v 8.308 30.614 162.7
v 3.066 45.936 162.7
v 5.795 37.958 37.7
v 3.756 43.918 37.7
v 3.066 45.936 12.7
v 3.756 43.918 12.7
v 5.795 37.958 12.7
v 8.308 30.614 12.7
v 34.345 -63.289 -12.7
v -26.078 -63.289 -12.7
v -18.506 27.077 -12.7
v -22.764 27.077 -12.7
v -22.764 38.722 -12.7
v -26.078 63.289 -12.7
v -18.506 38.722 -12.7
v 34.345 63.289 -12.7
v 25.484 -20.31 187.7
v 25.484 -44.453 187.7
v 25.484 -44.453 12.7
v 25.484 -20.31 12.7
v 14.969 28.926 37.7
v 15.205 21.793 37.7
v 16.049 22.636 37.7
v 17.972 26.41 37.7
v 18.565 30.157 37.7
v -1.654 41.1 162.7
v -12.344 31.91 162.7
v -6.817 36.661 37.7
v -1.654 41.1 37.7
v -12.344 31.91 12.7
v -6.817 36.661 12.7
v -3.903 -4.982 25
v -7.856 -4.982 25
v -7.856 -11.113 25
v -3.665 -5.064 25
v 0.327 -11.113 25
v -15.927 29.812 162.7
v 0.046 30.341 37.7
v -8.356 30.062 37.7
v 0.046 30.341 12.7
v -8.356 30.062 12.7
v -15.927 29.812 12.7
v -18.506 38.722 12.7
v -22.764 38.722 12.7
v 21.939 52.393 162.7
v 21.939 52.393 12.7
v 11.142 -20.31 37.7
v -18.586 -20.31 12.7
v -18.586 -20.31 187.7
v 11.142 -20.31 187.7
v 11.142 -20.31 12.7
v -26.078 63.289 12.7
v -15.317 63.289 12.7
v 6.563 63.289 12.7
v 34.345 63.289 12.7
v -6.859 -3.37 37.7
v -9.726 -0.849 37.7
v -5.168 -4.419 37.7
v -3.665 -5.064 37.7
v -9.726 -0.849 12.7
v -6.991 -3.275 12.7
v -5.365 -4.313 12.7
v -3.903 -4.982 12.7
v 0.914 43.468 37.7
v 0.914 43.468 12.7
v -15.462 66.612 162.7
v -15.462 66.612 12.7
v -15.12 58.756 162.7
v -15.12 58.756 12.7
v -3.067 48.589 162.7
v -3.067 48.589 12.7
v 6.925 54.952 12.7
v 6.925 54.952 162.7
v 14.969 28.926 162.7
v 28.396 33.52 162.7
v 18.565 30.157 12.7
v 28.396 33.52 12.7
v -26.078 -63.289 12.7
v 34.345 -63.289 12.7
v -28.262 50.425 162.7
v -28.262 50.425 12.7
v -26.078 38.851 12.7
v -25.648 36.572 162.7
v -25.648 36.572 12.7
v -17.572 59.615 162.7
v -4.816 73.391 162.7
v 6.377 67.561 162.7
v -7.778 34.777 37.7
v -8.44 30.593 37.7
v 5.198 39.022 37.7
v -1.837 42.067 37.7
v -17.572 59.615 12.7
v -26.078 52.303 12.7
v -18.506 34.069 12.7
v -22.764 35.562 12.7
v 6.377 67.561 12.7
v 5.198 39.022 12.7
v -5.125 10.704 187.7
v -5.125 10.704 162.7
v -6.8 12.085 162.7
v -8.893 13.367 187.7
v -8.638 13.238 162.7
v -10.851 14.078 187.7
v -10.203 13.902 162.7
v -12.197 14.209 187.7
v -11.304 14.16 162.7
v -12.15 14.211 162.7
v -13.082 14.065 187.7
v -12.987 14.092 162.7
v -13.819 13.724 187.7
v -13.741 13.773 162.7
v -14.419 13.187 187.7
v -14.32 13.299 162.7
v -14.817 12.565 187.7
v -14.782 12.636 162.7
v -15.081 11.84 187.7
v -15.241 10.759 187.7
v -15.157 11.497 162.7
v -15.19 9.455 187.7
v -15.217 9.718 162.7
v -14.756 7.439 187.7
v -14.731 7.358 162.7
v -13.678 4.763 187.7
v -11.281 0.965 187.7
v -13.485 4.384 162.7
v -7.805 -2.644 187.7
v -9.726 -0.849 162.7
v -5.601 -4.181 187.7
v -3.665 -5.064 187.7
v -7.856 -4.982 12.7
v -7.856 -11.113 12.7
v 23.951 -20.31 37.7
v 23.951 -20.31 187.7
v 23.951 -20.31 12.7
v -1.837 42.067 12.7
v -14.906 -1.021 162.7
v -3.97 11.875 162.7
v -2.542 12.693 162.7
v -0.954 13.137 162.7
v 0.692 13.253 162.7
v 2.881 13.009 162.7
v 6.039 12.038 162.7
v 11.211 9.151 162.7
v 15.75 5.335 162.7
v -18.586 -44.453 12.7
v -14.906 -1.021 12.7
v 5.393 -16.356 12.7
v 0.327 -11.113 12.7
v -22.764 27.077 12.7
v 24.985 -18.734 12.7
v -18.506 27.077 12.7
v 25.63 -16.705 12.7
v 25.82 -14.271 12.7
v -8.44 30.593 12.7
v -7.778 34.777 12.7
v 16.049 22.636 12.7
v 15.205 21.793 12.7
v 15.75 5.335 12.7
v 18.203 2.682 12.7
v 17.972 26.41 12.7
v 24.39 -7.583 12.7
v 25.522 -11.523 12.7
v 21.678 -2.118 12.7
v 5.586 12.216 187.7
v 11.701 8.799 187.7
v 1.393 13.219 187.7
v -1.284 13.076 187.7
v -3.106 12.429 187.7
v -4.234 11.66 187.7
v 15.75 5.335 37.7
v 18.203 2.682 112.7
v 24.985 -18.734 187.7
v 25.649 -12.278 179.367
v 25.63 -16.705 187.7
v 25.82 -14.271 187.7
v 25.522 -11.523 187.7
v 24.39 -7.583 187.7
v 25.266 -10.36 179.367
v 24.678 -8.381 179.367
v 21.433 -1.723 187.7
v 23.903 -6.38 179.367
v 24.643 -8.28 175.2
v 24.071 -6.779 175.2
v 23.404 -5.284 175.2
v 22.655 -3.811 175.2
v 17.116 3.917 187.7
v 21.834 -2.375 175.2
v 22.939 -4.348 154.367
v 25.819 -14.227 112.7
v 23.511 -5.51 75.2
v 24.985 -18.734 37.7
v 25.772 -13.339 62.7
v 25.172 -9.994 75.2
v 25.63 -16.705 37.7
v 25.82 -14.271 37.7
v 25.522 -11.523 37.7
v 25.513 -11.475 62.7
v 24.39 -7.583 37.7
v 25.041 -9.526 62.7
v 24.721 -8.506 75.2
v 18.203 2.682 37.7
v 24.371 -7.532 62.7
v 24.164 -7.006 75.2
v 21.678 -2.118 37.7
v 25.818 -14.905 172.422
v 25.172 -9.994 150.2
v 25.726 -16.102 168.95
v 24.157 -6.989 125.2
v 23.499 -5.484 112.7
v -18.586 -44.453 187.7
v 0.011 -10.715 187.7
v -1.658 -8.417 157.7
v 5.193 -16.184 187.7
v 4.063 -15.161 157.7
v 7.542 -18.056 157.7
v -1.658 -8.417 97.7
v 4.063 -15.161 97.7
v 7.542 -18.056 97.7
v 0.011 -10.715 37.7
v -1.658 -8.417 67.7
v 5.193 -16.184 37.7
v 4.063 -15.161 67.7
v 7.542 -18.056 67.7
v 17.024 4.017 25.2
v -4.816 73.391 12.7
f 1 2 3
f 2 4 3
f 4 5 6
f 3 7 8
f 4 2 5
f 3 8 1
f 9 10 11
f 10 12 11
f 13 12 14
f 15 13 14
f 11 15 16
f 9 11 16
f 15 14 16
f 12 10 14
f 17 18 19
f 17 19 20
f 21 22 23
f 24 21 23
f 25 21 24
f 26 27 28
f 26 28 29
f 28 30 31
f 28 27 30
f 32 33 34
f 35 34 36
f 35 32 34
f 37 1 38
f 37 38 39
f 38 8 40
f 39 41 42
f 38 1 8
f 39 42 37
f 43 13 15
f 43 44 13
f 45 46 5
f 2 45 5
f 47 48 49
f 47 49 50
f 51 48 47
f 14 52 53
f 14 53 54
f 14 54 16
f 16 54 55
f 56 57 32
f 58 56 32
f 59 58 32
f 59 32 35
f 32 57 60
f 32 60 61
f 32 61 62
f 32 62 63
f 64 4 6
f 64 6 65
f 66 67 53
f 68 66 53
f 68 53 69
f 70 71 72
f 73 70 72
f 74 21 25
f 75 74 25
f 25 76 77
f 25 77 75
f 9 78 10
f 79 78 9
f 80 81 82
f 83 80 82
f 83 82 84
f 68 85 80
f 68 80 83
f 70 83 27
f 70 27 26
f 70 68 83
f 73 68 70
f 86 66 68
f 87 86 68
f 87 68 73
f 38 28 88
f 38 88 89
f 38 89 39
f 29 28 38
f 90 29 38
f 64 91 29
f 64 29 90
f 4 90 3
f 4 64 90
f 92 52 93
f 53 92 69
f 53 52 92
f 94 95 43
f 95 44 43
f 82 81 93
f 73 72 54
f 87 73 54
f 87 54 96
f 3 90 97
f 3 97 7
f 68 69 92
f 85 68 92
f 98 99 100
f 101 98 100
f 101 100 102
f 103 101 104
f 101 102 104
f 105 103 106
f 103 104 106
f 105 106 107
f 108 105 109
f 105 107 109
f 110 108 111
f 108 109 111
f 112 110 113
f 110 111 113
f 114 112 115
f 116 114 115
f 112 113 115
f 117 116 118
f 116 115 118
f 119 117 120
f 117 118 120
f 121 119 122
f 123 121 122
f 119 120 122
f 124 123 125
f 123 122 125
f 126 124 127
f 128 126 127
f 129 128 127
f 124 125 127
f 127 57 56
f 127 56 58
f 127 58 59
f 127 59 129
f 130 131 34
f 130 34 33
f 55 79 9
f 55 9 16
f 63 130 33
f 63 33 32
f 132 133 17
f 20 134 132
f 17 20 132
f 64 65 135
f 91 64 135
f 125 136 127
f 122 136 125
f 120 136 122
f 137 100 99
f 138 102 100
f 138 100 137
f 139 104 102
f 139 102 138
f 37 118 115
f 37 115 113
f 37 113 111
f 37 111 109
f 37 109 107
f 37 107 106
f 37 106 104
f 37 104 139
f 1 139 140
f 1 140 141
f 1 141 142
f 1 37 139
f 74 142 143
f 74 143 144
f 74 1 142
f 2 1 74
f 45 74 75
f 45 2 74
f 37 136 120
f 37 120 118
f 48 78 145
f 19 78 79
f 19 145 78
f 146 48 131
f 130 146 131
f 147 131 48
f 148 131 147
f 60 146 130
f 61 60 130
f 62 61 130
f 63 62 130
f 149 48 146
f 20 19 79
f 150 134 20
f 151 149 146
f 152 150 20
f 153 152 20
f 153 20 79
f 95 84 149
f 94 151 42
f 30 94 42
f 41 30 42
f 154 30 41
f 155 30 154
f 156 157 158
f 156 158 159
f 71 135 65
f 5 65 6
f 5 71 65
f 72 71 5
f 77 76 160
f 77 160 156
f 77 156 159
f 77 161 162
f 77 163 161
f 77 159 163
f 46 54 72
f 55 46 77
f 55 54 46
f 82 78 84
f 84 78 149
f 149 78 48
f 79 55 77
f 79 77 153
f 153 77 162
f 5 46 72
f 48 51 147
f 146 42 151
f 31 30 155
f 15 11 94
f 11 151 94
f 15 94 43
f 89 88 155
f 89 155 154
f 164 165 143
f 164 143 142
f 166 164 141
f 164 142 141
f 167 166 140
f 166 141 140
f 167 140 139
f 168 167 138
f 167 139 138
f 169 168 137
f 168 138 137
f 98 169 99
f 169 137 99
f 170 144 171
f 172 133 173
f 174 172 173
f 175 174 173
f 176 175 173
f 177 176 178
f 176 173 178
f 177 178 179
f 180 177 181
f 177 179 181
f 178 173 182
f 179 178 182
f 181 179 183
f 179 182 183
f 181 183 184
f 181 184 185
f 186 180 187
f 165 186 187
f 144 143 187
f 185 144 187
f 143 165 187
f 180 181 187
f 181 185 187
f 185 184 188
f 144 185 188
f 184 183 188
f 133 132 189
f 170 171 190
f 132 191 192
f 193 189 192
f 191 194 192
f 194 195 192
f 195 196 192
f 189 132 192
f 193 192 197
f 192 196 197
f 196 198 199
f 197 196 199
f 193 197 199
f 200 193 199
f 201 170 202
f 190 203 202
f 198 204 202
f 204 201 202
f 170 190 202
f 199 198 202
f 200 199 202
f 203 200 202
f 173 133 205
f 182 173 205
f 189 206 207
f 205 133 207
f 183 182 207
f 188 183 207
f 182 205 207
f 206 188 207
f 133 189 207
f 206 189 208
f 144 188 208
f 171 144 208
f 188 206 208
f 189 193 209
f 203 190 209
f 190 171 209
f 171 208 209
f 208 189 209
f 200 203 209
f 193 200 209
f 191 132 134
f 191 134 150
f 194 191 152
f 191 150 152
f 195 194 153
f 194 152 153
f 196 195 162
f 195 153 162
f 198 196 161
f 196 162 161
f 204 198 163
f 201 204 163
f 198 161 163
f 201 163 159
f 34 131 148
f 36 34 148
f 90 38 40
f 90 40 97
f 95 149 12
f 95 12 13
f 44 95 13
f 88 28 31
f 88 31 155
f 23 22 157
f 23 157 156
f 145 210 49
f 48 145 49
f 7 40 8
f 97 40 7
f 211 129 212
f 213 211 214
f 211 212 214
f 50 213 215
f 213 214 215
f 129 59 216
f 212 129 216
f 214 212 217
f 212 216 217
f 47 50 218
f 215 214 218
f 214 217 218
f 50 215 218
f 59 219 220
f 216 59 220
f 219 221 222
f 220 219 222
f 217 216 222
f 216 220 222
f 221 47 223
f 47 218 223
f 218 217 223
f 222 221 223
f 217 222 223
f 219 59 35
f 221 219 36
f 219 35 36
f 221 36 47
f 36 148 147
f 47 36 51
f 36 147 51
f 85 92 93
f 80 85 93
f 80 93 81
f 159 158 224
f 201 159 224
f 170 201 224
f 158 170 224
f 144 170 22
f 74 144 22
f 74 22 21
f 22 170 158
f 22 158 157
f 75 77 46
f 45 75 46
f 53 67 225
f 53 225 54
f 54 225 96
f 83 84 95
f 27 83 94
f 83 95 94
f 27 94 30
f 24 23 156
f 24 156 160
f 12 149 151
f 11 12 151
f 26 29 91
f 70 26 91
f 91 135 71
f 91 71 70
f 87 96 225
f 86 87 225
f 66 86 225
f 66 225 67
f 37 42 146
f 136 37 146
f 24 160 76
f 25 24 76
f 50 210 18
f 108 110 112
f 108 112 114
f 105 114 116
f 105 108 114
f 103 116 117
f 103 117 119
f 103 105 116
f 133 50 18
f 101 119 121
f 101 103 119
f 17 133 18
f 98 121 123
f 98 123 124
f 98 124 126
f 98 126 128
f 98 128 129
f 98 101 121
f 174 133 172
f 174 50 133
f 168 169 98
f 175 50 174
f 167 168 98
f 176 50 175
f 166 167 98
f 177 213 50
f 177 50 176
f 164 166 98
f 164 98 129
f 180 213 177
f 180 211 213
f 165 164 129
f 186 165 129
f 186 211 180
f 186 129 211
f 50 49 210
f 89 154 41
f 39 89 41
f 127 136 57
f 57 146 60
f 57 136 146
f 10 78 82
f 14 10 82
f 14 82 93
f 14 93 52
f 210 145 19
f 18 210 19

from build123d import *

# Parameters (mm, degrees)
F0_W      = 60.4223795235
F0_H      = 126.5786588192
F0_W_2    = 4.2580850422
F0_H_2    = 11.6458535194
F1_DEPTH  = 12.7
F4_DEPTH  = 25
F5_W      = 44.0693465061
F5_H      = 24.1423398256
F6_DEPTH  = 25
F7_W      = 27.9744537547
F7_H      = 6.1313877814
F8_DEPTH  = 25
F10_DEPTH = 25
F13_DEPTH = 150


with BuildPart() as f1:
    # F0 (on Top) → F1 (new body, symmetric)
    with BuildSketch(Plane.XY):
        with Locations((4.1334796697, 0)):
            Rectangle(F0_W, F0_H)
        with Locations((-20.6351820379, 32.8994877636)):
            Rectangle(F0_W_2, F0_H_2, mode=Mode.SUBTRACT)
    extrude(amount=F1_DEPTH, both=True)

    # F3 (on face) → F4 (join)
    with BuildSketch(Plane.XY.offset(12.7)):
        Polygon((9.2804457981, 43.4682284111), (5.0971903838, 44.1307909787), (0.9139349695, 43.4682284111), (-2.8598342584, 41.545396949), (-5.8547144745, 38.5505167329), (-7.7775459366, 34.776747505), (-8.4401085041, 30.5934920907), (-7.7775459366, 26.4102366764), (-5.8547144745, 22.6364674485), (-2.8598342584, 19.6415872324), (0.9139349695, 17.7187557703), (5.0971903838, 17.0561932027), (9.2804457981, 17.7187557703), (13.054215026, 19.6415872324), (16.0490952421, 22.6364674485), (17.9719267043, 26.4102366764), (18.6344892718, 30.5934920907), (17.9719267043, 34.776747505), (16.0490952421, 38.5505167329), (13.054215026, 41.545396949), align=None)
        Polygon((-2.2527005044, 26.4659842643), (5.197609196, 39.0224382281), (12.3466624599, 26.2920537797), align=None, mode=Mode.SUBTRACT)
    extrude(amount=F4_DEPTH)

    # F5 (on face) → F6 (join)
    with BuildSketch(Plane.XY.offset(12.7)):
        with Locations((3.4489056561, -32.3813892901)):
            Rectangle(F5_W, F5_H)
    extrude(amount=F6_DEPTH)

    # F7 (on Top) → F8 (join)
    with BuildSketch(Plane.XY):
        with Locations((6.1313877814, -8.0474459101)):
            Rectangle(F7_W, F7_H)
    extrude(amount=F8_DEPTH)

    # F9 (on face) → F10 (join)
    with BuildSketch(Plane.XY.offset(12.7)):
        with BuildLine():
            add(Edge.make_bspline(
                [(-3.6654782741, -5.0642236167), (-1.2137473257, -5.8734401187), (0.1916065812, -4.7901463695)],
                knots=[5.6666909862, 5.6666909862, 5.6666909862, 6.2831853072, 6.2831853072, 6.2831853072], degree=2, weights=[1, 0.9528668255, 1]))
            add(Edge.make_bspline(
                [(0.1916065812, -4.7901463695), (6.4545371904, 0.0375298105), (-5.1250907994, 10.7039809585)],
                knots=[0, 0, 0, 1.9137670292, 1.9137670292, 1.9137670292], degree=2, weights=[1, 0.5760701954, 1]))
            add(Edge.make_bspline(
                [(-5.1250907994, 10.7039809585), (-9.1468374458, 5.3420650054), (-3.6654782741, -5.0642236167)],
                knots=[0.1210246027, 0.1210246027, 0.1210246027, 1.1768049687, 1.1768049687, 1.1768049687], degree=2, weights=[1, 0.8638717322, 1]))
        make_face()
        with BuildLine():
            add(Edge.make_bspline(
                [(0.1916065812, -4.7901463695), (6.4545371904, 0.0375298105), (-5.1250907994, 10.7039809585)],
                knots=[0, 0, 0, 1.9137670292, 1.9137670292, 1.9137670292], degree=2, weights=[1, 0.5760701954, 1]))
            add(Edge.make_bspline(
                [(-3.6654782741, -5.0642236167), (-1.2137473257, -5.8734401187), (0.1916065812, -4.7901463695)],
                knots=[5.6666909862, 5.6666909862, 5.6666909862, 6.2831853072, 6.2831853072, 6.2831853072], degree=2, weights=[1, 0.9528668255, 1]))
            add(Edge.make_bspline(
                [(-3.6654782741, -5.0642236167), (7.7967294339, -26.8250748804), (21.3915865986, -22.0091251639), (34.9864437633, -17.1931754474), (18.2025562972, 2.6824818924)],
                knots=[1.1768049687, 1.1768049687, 1.1768049687, 2.9445969746, 2.9445969746, 4.7123889804, 4.7123889804, 4.7123889804], degree=2, weights=[1, 0.6341435153, 1, 0.6341435153, 1]))
            add(Edge.make_bspline(
                [(18.2025562972, 2.6824818924), (2.66192218, 21.0858654459), (-5.1250907994, 10.7039809585)],
                knots=[4.7123889804, 4.7123889804, 4.7123889804, 6.4042099098, 6.4042099098, 6.4042099098], degree=2, weights=[1, 0.6630500062, 1]))
        make_face()
        with BuildLine():
            add(Edge.make_bspline(
                [(-5.1250907994, 10.7039809585), (-9.1468374458, 5.3420650054), (-3.6654782741, -5.0642236167)],
                knots=[0.1210246027, 0.1210246027, 0.1210246027, 1.1768049687, 1.1768049687, 1.1768049687], degree=2, weights=[1, 0.8638717322, 1]))
            add(Edge.make_bspline(
                [(-5.1250907994, 10.7039809585), (-16.2578023137, 20.958759749), (-15.2138378826, 9.6808045144), (-14.1698734514, -1.5971507202), (-3.6654782741, -5.0642236167)],
                knots=[1.9137670292, 1.9137670292, 1.9137670292, 3.7902290077, 3.7902290077, 5.6666909862, 5.6666909862, 5.6666909862], degree=2, weights=[1, 0.5912156804, 1, 0.5912156804, 1]))
        make_face()
    extrude(amount=F10_DEPTH)

    # F12 (on face) + F10_face (on face) → F13 (join)
    with BuildSketch(Plane.XY.offset(12.7)):
        Polygon((-15.1200483821, 58.7558450371), (-4.268118646, 54.9524389207), (-3.0674270983, 48.5890431418), (6.9253058173, 54.9524389207), (6.3772096892, 67.5610487277), (-4.8162147741, 73.3906884605), (-15.4615431093, 66.6117183864), align=None)
        Polygon((-3.0674270983, 48.5890431418), (-4.268118646, 54.9524389207), (-15.1200483821, 58.7558450371), (-14.9134469812, 54.0031085795), (-3.7200225179, 48.1734688466), align=None)
        Polygon((-1.6542957296, 41.0997639807), (-3.0674270983, 48.5890431418), (-3.7200225179, 48.1734688466), (-14.9134469812, 54.0031085795), (-15.1200483821, 58.7558450371), (-17.5717985126, 59.6151393441), (-28.2616554628, 50.4251648275), (-25.6478325464, 36.5724898875), (-12.3441526798, 31.9097894641), align=None)
        Polygon((28.3961594105, 33.5202328861), (21.9387635589, 52.3932985961), (3.0656978488, 45.9359027445), (8.3079936012, 30.6142166531), (14.9058774114, 30.8326855302), (14.9690065658, 28.9261493169), align=None)
        Polygon((15.9268081188, 0), (14.9690065658, 28.9261493169), (9.5230937004, 27.0628370345), (8.3079936012, 30.6142166531), (-15.9268081188, 29.8117548227), (-14.9058774114, -1.0209307075), align=None)
        Polygon((9.5230937004, 27.0628370345), (14.9690065658, 28.9261493169), (14.9058774114, 30.8326855302), (8.3079936012, 30.6142166531), align=None)
    with BuildSketch(Plane(origin=(4.9113998877, -19.1714286629, 37.7), x_dir=(1, 0, 0), z_dir=(0, 0, 1))):
        with BuildLine():
            Line((20.5721790215, -25.2811305401), (20.5721790215, -1.1387907144))
            Line((20.5721790215, -1.1387907144), (19.0393327914, -1.1387907144))
            add(Edge.make_bspline(
                [(19.0393327914, -1.1387907144), (21.2490059306, 1.3356954103), (22.1859609961, 5.7952845742), (20.4843675369, 11.8248238632), (16.8415372864, 17.6495119094), (9.1694693906, 26.7348559867), (2.9158744634, 32.08683227), (-3.618455925, 34.3337423373), (-7.9712190855, 32.6288930507), (-10.0364906871, 29.8754096213)],
                knots=[3.2381563984, 3.2381563984, 3.2381563984, 3.2381563984, 3.2381563984, 3.2381563984, 4.7123889804, 4.7123889804, 4.7123889804, 4.7123889804, 6.4238462878, 6.4238462878, 6.4238462878, 6.4238462878, 6.4238462878, 6.4238462878], degree=5, weights=[0.9897321171, 0.9732134667, 0.9503985365, 0.9627650148, 1, 1, 0.9545858807, 0.9545858807, 1, 1]))
            add(Edge.make_bspline(
                [(-10.0364906871, 29.8754096213), (-21.1692022014, 40.1301884118), (-20.1252377703, 28.8522331772), (-19.0812733391, 17.5742779427), (-8.5768781618, 14.1072050461)],
                knots=[1.9137670292, 1.9137670292, 1.9137670292, 3.7902290077, 3.7902290077, 5.6666909862, 5.6666909862, 5.6666909862], degree=2, weights=[1, 0.5912156804, 1, 0.5912156804, 1]))
            add(Edge.make_bspline(
                [(-8.5768781618, 14.1072050461), (-6.867540918, 10.8620506684), (-4.3486920685, 7.1585507312), (-1.0610908327, 3.5964338438), (2.6377751049, 0.7453286942), (6.2308483777, -1.1387907144)],
                knots=[1.1768049687, 1.1768049687, 1.1768049687, 1.1768049687, 1.1768049687, 1.1768049687, 2.2161101678, 2.2161101678, 2.2161101678, 2.2161101678, 2.2161101678, 2.2161101678], degree=5, weights=[1, 1, 0.9814943061, 0.9662423378, 0.9632109021, 0.968574194]))
            Line((6.2308483777, -1.1387907144), (-23.4971674847, -1.1387907144))
            Line((-23.4971674847, -1.1387907144), (-23.4971674847, -25.2811305401))
            Line((-23.4971674847, -25.2811305401), (20.5721790215, -25.2811305401))
        make_face()
    extrude(amount=F13_DEPTH)


solid = f1.part
